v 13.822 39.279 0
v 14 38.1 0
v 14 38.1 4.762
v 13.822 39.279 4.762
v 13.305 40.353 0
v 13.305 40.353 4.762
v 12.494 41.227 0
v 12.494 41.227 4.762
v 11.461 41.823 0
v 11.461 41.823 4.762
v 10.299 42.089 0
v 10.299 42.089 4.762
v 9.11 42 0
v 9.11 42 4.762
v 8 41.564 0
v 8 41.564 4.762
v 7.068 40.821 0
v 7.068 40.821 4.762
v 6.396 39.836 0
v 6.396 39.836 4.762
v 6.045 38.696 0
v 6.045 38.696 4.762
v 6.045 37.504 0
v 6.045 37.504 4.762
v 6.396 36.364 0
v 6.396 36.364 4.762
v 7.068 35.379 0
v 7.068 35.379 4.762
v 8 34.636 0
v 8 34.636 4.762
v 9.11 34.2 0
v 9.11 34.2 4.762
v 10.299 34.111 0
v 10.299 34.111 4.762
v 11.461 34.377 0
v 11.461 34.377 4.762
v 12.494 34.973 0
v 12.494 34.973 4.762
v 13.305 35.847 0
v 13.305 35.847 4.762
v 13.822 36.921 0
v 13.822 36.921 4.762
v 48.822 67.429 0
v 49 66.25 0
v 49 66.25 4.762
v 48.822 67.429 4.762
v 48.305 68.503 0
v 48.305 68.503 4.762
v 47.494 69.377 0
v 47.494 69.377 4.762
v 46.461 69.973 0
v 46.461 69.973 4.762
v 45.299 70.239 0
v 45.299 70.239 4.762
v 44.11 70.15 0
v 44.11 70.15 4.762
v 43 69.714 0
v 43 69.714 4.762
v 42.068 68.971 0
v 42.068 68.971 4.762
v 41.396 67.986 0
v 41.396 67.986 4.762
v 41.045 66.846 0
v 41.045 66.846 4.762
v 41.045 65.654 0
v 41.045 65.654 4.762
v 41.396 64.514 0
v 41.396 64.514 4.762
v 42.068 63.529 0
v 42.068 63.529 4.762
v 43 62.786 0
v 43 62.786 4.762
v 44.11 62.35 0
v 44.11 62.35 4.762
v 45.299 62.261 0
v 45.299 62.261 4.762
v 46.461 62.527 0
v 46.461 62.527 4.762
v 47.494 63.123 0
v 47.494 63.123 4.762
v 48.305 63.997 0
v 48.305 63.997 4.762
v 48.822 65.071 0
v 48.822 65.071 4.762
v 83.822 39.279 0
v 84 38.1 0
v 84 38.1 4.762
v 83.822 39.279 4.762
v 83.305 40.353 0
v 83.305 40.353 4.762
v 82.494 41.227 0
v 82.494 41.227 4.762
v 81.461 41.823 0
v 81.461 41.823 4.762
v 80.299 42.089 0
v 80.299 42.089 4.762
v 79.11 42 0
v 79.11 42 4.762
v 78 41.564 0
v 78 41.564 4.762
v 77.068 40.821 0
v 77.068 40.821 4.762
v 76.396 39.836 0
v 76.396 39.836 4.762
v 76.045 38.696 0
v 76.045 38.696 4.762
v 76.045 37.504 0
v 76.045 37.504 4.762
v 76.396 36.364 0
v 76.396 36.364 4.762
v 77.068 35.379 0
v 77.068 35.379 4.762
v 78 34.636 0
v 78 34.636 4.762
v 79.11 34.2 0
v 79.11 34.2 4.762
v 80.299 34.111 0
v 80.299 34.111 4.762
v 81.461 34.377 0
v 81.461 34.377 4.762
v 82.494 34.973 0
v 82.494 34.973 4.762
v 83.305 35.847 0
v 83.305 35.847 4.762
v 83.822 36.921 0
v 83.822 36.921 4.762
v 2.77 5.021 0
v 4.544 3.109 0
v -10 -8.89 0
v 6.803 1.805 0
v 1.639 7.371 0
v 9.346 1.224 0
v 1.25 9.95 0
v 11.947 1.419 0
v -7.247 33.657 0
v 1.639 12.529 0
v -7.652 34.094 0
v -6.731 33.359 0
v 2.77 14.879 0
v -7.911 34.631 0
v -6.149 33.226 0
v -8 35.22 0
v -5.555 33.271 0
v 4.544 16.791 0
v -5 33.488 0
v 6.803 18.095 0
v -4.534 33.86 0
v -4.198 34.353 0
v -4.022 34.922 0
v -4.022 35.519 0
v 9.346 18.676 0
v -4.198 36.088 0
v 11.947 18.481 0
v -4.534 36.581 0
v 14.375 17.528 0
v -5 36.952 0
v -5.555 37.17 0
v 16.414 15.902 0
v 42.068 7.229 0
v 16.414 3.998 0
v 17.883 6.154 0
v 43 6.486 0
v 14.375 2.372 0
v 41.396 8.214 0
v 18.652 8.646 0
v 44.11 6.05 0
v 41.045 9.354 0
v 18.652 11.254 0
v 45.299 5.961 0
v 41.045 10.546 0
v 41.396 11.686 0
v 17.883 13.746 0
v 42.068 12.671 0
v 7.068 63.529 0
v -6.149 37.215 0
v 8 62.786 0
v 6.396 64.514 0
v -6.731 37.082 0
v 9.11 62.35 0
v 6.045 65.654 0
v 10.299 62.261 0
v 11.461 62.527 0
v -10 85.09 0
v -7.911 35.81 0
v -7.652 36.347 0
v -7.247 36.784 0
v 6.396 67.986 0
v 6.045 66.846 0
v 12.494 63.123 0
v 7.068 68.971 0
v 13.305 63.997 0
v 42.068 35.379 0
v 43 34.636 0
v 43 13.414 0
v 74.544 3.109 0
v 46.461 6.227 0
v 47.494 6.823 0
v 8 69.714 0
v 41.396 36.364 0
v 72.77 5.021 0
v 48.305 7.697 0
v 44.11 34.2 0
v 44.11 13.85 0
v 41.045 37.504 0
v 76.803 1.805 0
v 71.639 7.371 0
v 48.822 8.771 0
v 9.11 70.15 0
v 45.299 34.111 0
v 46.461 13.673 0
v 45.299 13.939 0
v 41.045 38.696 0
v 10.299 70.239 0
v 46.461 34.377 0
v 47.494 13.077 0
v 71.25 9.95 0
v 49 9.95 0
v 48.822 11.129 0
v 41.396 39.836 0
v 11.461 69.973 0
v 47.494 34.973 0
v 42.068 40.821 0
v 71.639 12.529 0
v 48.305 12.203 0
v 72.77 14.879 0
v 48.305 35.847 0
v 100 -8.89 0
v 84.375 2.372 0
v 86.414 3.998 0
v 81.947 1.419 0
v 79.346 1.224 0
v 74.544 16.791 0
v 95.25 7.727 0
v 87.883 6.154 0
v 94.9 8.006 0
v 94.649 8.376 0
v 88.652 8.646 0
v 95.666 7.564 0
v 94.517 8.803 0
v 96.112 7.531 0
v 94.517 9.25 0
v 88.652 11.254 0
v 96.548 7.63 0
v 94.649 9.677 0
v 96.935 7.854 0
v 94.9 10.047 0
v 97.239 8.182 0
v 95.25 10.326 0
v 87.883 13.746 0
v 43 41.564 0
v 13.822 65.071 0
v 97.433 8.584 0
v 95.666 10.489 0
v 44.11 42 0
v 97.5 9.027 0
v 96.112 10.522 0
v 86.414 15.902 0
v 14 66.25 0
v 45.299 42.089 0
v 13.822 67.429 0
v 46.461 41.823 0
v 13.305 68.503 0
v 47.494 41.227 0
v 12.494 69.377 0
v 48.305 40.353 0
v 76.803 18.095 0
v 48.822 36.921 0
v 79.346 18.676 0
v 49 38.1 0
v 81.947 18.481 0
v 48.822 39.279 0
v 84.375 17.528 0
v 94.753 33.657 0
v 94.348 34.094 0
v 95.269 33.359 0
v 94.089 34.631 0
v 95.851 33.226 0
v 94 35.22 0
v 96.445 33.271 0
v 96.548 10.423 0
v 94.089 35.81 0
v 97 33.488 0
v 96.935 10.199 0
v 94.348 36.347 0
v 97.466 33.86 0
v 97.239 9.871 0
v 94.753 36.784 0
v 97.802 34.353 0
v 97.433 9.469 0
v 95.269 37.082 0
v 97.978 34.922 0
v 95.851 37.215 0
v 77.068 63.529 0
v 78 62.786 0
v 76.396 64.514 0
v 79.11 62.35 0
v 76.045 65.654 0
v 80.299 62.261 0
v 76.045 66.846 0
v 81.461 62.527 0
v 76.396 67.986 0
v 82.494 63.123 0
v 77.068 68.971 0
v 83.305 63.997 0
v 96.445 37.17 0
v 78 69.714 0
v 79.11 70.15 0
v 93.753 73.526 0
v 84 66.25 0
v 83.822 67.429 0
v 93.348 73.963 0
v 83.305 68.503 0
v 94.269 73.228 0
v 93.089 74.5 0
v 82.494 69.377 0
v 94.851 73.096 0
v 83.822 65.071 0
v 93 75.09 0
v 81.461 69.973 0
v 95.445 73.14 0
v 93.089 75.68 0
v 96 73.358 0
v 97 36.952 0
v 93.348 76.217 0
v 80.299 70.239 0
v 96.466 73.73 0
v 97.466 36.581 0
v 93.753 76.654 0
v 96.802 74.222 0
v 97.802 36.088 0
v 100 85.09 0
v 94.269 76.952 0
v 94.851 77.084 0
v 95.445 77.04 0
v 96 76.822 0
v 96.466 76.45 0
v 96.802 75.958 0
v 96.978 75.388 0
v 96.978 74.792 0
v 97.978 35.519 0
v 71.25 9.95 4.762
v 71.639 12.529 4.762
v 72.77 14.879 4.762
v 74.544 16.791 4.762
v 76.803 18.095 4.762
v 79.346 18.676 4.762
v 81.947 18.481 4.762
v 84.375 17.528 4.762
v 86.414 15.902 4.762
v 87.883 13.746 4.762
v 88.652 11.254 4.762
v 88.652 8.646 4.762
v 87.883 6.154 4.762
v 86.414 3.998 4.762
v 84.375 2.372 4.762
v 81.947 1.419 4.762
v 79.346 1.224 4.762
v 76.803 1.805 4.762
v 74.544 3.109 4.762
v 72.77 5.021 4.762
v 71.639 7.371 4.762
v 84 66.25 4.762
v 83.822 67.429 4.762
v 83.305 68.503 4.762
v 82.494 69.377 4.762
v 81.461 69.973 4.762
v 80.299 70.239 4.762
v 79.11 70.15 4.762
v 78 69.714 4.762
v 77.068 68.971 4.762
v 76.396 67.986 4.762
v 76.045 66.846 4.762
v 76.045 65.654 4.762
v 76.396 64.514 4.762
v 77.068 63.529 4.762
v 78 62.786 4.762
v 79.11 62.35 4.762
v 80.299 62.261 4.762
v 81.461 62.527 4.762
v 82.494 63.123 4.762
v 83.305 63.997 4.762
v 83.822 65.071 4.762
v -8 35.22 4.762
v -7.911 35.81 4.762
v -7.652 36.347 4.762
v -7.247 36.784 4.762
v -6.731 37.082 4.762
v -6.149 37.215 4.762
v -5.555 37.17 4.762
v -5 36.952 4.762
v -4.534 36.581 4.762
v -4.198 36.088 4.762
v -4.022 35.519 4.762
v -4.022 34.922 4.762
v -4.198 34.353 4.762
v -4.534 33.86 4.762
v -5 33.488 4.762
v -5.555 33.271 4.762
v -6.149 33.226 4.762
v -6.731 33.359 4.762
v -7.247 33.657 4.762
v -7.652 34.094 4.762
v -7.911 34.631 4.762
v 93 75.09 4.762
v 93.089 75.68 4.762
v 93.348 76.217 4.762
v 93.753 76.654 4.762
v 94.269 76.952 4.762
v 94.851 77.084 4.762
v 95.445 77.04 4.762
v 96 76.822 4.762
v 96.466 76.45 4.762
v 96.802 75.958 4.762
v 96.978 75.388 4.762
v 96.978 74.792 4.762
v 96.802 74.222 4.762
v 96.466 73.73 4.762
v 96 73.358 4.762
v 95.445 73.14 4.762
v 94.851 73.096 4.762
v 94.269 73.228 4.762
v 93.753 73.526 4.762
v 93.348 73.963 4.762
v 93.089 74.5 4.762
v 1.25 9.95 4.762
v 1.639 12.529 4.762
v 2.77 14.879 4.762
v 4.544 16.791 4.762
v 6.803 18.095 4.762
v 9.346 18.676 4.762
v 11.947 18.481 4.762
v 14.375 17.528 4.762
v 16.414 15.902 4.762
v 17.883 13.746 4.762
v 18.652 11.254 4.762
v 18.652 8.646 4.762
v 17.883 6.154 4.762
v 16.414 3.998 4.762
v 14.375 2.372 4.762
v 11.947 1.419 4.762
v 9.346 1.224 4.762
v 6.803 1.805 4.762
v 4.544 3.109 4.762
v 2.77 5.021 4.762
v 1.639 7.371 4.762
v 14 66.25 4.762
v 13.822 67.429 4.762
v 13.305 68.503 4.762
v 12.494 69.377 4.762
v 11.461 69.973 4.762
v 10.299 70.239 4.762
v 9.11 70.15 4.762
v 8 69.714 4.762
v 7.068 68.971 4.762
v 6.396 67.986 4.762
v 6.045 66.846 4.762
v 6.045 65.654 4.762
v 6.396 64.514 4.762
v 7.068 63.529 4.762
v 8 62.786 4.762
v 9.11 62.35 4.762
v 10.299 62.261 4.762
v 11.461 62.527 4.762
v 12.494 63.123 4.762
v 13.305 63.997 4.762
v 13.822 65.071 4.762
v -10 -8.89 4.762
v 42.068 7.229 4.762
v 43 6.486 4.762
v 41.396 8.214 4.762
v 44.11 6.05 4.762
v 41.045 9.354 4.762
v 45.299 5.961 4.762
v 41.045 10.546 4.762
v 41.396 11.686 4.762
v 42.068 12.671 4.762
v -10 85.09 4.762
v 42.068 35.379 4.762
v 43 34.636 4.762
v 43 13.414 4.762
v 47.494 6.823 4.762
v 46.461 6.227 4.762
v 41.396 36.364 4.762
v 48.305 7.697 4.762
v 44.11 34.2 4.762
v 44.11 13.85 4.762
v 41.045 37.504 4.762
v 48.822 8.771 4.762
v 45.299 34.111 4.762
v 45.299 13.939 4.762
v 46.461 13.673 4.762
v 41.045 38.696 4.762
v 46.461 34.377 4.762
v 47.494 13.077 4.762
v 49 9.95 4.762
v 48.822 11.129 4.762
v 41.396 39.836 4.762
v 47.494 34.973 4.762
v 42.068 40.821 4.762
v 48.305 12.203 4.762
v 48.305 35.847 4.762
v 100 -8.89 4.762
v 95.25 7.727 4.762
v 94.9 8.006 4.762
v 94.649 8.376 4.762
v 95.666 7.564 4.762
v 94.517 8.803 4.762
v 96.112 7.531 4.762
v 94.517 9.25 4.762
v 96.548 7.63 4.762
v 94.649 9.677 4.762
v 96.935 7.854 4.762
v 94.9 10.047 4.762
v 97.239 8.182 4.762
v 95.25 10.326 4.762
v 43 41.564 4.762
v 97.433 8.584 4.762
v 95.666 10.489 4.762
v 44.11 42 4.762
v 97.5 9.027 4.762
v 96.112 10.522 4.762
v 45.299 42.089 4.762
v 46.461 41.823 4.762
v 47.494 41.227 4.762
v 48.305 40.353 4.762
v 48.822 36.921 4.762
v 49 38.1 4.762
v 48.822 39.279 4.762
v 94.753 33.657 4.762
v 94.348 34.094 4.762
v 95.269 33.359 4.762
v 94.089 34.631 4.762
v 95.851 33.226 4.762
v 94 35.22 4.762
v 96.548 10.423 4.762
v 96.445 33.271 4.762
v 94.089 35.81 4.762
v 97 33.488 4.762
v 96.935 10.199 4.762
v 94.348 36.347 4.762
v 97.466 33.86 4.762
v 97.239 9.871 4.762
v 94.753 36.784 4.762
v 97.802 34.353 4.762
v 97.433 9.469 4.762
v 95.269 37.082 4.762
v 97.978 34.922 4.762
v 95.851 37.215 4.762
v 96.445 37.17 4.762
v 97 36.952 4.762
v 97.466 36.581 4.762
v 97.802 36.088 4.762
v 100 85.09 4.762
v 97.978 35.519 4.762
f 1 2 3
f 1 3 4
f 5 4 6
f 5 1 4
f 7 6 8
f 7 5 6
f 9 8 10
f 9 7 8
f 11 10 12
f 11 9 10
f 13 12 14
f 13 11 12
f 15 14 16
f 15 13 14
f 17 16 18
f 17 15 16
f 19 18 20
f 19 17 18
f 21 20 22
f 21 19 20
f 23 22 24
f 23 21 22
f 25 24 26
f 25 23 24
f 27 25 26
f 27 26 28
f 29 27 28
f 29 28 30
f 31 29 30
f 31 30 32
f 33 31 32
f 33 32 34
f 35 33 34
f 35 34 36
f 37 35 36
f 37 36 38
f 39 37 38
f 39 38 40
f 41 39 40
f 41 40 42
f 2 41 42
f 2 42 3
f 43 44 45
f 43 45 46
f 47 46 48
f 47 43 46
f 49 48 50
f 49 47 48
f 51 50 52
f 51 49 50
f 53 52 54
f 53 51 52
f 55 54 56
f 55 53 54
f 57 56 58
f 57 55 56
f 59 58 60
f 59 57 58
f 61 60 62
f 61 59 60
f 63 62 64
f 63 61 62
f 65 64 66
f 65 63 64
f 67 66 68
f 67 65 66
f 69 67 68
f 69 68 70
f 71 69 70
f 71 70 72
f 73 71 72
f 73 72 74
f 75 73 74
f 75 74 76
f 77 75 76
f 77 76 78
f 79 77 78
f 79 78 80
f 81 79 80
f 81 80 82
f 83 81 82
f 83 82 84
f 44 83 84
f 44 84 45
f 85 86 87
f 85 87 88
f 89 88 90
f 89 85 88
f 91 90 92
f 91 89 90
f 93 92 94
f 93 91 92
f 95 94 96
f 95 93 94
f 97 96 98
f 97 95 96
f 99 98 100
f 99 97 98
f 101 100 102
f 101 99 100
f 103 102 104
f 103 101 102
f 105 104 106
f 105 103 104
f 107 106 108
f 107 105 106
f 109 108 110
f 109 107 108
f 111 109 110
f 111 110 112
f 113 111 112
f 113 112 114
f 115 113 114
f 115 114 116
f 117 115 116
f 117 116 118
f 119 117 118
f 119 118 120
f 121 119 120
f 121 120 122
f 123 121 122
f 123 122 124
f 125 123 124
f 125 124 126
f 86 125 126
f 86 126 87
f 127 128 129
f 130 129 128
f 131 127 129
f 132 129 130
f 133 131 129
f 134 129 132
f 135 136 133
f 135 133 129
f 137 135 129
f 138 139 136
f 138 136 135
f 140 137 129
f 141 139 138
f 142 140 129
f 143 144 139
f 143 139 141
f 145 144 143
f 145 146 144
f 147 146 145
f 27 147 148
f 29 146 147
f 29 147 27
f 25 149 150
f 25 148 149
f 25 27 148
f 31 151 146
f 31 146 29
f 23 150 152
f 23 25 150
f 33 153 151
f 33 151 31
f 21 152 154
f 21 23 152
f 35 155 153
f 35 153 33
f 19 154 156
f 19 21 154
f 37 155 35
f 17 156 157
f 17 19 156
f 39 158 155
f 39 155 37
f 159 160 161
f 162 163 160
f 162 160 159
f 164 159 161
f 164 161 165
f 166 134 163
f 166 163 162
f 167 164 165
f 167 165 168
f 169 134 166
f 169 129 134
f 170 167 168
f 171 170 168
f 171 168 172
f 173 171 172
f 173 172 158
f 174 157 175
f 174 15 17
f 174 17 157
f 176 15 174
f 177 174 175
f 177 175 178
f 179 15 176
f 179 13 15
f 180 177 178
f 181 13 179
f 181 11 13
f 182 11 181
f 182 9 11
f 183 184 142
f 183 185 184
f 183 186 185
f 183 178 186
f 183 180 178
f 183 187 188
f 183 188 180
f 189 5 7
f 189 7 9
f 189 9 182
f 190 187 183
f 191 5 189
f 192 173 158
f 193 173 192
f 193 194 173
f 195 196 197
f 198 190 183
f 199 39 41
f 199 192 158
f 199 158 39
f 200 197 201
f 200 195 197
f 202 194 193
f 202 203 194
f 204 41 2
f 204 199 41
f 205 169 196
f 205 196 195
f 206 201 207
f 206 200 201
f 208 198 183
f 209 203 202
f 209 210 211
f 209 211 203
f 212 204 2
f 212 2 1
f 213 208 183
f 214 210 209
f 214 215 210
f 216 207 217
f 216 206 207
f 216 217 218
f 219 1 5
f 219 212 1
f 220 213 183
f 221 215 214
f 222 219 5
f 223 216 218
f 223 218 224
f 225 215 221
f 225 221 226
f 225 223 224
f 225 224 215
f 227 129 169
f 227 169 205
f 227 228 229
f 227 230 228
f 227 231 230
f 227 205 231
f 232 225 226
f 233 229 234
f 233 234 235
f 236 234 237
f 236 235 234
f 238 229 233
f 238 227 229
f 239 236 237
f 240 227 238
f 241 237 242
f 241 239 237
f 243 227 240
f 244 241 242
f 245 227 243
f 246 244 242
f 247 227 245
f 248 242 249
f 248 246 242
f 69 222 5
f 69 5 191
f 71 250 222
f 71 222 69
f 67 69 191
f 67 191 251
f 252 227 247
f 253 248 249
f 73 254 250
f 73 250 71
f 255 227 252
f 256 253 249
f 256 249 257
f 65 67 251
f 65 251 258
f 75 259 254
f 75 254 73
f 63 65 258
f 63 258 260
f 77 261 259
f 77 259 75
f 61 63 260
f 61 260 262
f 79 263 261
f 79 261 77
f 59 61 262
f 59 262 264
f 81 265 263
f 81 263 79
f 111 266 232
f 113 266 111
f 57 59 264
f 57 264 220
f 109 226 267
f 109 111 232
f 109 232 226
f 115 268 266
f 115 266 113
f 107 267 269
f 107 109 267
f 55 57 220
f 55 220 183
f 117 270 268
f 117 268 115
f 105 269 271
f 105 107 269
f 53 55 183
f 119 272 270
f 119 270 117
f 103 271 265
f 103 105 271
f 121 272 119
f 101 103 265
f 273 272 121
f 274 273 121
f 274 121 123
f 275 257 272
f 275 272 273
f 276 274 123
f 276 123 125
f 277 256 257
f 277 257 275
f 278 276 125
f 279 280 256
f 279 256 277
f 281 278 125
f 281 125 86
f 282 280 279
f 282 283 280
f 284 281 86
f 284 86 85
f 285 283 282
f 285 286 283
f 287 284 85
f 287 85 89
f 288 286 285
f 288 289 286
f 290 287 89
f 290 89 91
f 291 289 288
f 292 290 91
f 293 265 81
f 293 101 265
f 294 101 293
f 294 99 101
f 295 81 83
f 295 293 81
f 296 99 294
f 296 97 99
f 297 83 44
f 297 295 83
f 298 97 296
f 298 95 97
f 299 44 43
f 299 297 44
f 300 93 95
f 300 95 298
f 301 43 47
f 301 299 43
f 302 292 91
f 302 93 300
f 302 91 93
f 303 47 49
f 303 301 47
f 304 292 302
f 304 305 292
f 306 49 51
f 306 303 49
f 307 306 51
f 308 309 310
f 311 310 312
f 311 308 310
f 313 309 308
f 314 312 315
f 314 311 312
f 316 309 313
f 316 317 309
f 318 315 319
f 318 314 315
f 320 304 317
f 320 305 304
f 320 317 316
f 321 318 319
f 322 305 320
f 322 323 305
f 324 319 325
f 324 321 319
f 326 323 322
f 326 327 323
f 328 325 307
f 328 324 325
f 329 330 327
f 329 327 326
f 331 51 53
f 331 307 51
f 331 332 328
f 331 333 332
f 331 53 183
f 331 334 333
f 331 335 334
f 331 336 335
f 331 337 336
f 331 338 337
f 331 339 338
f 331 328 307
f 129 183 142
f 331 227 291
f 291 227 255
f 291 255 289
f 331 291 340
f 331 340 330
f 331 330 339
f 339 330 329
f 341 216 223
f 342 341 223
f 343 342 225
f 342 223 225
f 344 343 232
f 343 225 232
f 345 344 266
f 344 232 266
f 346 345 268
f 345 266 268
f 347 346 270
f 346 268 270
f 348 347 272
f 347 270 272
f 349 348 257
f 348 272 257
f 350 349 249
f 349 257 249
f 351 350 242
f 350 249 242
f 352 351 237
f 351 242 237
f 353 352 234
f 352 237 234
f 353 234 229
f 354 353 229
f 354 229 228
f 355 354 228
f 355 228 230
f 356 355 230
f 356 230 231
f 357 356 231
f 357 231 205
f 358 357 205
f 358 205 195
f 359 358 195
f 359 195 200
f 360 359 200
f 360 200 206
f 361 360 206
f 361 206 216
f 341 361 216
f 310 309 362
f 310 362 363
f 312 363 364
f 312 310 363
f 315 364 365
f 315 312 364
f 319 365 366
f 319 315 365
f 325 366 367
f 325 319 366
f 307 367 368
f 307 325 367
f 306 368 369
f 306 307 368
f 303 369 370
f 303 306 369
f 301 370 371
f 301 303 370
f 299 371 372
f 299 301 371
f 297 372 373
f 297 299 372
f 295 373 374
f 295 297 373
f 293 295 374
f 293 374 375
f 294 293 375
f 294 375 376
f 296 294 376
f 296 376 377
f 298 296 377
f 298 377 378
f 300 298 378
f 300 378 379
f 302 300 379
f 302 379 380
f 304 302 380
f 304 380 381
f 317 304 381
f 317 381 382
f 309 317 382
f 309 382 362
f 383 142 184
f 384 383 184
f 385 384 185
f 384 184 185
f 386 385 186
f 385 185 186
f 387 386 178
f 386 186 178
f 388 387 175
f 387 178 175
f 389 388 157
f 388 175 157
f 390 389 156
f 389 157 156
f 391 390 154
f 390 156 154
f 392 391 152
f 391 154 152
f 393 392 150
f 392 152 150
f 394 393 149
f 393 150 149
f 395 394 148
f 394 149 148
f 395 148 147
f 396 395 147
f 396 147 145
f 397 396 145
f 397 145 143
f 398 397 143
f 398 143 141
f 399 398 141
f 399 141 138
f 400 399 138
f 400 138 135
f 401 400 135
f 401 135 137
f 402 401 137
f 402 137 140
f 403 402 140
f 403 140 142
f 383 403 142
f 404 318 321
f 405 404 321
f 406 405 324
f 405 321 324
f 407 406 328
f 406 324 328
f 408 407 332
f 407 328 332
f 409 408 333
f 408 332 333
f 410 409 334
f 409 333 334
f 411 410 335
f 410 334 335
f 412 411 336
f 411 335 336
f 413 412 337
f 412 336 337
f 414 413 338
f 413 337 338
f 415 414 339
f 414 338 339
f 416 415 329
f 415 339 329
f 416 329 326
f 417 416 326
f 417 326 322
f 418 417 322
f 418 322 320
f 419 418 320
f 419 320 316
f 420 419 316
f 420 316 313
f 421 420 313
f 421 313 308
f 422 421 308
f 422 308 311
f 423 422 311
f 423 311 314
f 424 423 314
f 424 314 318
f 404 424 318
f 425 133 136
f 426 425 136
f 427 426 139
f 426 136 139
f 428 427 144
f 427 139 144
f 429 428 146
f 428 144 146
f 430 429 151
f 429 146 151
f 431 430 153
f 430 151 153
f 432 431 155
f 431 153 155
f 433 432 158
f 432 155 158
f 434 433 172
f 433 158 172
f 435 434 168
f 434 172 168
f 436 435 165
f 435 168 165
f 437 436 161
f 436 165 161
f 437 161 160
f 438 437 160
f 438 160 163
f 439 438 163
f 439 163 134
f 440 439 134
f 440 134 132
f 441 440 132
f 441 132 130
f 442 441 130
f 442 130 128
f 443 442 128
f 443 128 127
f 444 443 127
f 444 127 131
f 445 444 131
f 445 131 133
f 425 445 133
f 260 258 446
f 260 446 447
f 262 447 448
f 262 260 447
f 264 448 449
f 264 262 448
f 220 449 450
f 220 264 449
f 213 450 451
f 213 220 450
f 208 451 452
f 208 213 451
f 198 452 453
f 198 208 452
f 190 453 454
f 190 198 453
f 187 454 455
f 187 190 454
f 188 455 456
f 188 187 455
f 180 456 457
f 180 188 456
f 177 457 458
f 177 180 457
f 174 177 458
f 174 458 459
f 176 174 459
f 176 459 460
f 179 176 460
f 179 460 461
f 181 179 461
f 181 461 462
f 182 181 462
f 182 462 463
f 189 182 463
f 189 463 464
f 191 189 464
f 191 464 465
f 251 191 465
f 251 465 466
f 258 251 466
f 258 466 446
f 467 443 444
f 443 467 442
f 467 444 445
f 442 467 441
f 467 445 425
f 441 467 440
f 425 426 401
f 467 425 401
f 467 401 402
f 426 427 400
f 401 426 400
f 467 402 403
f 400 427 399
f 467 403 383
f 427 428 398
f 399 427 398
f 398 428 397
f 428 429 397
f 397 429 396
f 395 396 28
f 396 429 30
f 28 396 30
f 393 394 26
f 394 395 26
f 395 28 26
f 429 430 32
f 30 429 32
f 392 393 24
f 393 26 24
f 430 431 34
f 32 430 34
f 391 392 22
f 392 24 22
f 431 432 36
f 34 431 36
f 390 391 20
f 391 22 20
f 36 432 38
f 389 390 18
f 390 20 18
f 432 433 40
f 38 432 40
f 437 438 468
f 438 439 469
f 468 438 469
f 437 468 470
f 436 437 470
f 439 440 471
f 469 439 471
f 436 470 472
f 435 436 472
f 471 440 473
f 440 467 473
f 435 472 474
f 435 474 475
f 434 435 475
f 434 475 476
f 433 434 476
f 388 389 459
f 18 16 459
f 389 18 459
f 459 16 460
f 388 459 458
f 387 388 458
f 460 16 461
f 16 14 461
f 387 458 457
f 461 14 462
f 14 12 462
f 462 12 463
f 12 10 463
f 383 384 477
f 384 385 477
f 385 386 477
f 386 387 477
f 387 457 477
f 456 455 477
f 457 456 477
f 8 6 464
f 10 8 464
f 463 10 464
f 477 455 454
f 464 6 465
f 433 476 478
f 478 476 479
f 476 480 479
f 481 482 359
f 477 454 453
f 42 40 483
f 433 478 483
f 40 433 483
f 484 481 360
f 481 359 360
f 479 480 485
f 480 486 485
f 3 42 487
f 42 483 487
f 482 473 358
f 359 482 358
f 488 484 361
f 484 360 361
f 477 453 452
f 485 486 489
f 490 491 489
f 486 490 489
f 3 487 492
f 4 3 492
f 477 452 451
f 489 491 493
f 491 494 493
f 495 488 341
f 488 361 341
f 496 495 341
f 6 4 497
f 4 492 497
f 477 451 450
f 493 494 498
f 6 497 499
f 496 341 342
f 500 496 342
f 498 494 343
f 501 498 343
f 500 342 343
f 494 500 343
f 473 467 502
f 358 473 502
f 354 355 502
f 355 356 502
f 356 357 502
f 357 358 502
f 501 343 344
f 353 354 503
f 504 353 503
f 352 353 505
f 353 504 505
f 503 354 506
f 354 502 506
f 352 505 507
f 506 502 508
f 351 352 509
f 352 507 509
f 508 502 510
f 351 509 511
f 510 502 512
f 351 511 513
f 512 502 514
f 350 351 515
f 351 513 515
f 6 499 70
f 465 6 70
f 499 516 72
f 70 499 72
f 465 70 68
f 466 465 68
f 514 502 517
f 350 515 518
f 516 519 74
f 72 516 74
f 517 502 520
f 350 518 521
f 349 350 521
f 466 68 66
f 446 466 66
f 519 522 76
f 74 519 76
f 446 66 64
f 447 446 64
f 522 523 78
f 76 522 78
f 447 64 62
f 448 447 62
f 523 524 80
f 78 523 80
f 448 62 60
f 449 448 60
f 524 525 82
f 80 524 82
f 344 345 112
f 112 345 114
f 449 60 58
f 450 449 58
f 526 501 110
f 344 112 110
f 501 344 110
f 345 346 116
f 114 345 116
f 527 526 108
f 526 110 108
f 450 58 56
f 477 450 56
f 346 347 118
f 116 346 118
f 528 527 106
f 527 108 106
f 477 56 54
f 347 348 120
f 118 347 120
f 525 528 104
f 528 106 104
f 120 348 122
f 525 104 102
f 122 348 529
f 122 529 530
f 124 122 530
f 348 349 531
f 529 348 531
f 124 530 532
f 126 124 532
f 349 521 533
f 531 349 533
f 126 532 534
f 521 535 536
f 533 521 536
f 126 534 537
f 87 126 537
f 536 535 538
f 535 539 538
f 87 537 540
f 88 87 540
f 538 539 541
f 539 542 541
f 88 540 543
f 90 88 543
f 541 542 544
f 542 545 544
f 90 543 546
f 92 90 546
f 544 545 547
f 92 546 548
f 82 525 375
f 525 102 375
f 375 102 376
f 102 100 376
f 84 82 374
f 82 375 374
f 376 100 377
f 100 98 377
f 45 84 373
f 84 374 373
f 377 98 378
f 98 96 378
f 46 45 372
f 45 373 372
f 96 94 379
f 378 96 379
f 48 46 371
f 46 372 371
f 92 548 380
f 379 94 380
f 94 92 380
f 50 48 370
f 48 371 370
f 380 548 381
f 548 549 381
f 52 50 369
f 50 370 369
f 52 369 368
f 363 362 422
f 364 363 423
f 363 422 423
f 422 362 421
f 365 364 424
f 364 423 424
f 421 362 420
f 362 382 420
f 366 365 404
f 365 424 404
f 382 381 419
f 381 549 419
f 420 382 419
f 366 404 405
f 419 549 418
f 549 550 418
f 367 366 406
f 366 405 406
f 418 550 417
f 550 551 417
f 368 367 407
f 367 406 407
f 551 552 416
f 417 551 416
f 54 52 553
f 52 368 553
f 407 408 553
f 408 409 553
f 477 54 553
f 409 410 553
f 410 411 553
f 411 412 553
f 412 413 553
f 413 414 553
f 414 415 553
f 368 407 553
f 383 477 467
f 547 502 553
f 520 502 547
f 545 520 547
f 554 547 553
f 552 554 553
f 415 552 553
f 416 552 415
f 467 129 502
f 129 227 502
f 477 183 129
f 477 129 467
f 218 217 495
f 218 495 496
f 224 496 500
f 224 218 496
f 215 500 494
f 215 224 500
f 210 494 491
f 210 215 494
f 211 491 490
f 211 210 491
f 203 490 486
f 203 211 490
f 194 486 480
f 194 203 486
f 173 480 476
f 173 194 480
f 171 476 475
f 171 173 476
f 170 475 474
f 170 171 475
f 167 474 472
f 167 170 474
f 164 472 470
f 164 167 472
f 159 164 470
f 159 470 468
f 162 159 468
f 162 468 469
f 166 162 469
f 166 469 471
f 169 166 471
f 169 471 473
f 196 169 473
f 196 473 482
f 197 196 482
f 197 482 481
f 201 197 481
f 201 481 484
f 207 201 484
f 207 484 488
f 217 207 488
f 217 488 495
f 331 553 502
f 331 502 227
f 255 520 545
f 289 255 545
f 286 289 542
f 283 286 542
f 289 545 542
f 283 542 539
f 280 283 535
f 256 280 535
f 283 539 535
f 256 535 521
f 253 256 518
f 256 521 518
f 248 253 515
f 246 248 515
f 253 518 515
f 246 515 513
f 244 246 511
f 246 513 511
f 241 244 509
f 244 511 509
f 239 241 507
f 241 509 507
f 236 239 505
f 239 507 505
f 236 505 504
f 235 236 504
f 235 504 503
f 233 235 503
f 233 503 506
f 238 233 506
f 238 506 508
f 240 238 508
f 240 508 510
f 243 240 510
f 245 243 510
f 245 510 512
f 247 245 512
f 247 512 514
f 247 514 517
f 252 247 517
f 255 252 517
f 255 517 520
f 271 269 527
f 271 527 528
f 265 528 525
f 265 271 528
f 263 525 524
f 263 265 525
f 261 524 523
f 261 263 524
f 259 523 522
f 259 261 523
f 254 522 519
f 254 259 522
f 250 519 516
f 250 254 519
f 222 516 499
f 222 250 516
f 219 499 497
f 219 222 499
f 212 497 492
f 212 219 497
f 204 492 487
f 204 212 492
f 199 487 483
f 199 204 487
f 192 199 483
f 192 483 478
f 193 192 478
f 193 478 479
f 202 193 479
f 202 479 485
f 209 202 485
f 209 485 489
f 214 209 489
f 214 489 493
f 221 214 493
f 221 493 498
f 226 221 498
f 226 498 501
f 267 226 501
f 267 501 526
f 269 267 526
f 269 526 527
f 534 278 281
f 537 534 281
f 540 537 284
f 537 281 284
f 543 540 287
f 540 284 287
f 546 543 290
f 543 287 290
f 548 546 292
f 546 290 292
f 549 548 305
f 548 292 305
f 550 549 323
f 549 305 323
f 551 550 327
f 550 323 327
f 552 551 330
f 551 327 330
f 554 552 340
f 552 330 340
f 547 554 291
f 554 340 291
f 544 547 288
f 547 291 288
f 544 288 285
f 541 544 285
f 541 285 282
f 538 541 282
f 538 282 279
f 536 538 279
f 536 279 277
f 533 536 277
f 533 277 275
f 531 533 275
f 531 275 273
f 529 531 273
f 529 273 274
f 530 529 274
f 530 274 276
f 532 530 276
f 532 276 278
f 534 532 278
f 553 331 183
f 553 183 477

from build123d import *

# Parameters (mm, degrees)
CROQUIS1_W               = 90
CROQUIS1_H               = 76.2
CROQUIS1_R               = 4
SALIENTE_EXTRUIR1_DEPTH  = 0.47625
CROQUIS1_2_W             = 90
CROQUIS1_2_H             = 76.2
CROQUIS1_2_R             = 4
SALIENTE_EXTRUIR2_DEPTH  = 4.7625
CROQUIS3_W               = 90
CROQUIS3_H               = 4.7625
SALIENTE_EXTRUIR3_DEPTH  = 4.445
CROQUIS5_W               = 90
CROQUIS5_H               = 4.7625
SALIENTE_EXTRUIR4_DEPTH  = 4.445
CROQUIS6_W               = 4.7625
CROQUIS6_H               = 85.09
SALIENTE_EXTRUIR5_DEPTH  = 5
CROQUIS7_W               = 4.7625
CROQUIS7_H               = 85.09
SALIENTE_EXTRUIR6_DEPTH  = 5
CROQUIS8_W               = 100
CROQUIS8_H               = 4.7625
SALIENTE_EXTRUIR7_DEPTH  = 4.445
CROQUIS9_W               = 100
CROQUIS9_H               = 4.7625
SALIENTE_EXTRUIR8_DEPTH  = 4.445
CROQUIS10_W              = 4.7625
CROQUIS10_H              = 93.98
SALIENTE_EXTRUIR9_DEPTH  = 5
CROQUIS12_W              = 4.7625
CROQUIS12_H              = 93.98
SALIENTE_EXTRUIR10_DEPTH = 5
SKETCH1_R                = 8.75
CUT_EXTRUDE1_DEPTH       = 10
SKETCH2_R                = 2
CUT_EXTRUDE2_DEPTH       = 10
SKETCH3_R                = 1.5
CUT_EXTRUDE3_DEPTH       = 10
SKETCH4_R                = 2
CUT_EXTRUDE4_DEPTH       = 10


with BuildPart() as part:
    # Croquis1 → Saliente-Extruir1 (new body)
    with BuildSketch(Plane.XY):
        with Locations((45, 38.1)):
            Rectangle(CROQUIS1_W, CROQUIS1_H)
        with Locations((45, 38.1)):
            Circle(CROQUIS1_R, mode=Mode.SUBTRACT)
        with Locations((10, 9.95)):
            Circle(CROQUIS1_R, mode=Mode.SUBTRACT)
        with Locations((10, 66.25)):
            Circle(CROQUIS1_R, mode=Mode.SUBTRACT)
        with Locations((80, 66.25)):
            Circle(CROQUIS1_R, mode=Mode.SUBTRACT)
        with Locations((80, 9.95)):
            Circle(CROQUIS1_R, mode=Mode.SUBTRACT)
        with Locations((45, 66.25)):
            Circle(CROQUIS1_R, mode=Mode.SUBTRACT)
        with Locations((10, 38.1)):
            Circle(CROQUIS1_R, mode=Mode.SUBTRACT)
        with Locations((80, 38.1)):
            Circle(CROQUIS1_R, mode=Mode.SUBTRACT)
        with Locations((45, 9.95)):
            Circle(CROQUIS1_R, mode=Mode.SUBTRACT)
    extrude(amount=SALIENTE_EXTRUIR1_DEPTH)

    # Croquis1<2> → Saliente-Extruir2 (add)
    with BuildSketch(Plane.XY):
        with Locations((45, 38.1)):
            Rectangle(CROQUIS1_2_W, CROQUIS1_2_H)
        with Locations((45, 38.1)):
            Circle(CROQUIS1_2_R, mode=Mode.SUBTRACT)
        with Locations((10, 9.95)):
            Circle(CROQUIS1_2_R, mode=Mode.SUBTRACT)
        with Locations((10, 66.25)):
            Circle(CROQUIS1_2_R, mode=Mode.SUBTRACT)
        with Locations((80, 66.25)):
            Circle(CROQUIS1_2_R, mode=Mode.SUBTRACT)
        with Locations((80, 9.95)):
            Circle(CROQUIS1_2_R, mode=Mode.SUBTRACT)
        with Locations((45, 66.25)):
            Circle(CROQUIS1_2_R, mode=Mode.SUBTRACT)
        with Locations((10, 38.1)):
            Circle(CROQUIS1_2_R, mode=Mode.SUBTRACT)
        with Locations((80, 38.1)):
            Circle(CROQUIS1_2_R, mode=Mode.SUBTRACT)
        with Locations((45, 9.95)):
            Circle(CROQUIS1_2_R, mode=Mode.SUBTRACT)
    extrude(amount=SALIENTE_EXTRUIR2_DEPTH)

    # Croquis3 → Saliente-Extruir3 (add)
    with BuildSketch(Plane.XZ):
        with Locations((45, 2.38125)):
            Rectangle(CROQUIS3_W, CROQUIS3_H)
    extrude(amount=SALIENTE_EXTRUIR3_DEPTH)

    # Croquis5 → Saliente-Extruir4 (add)
    with BuildSketch(Plane(origin=(0, 76.2, 0), x_dir=(1, 0, 0), z_dir=(0, 1, 0))):
        with Locations((45, -2.38125)):
            Rectangle(CROQUIS5_W, CROQUIS5_H)
    extrude(amount=SALIENTE_EXTRUIR4_DEPTH)

    # Croquis6 → Saliente-Extruir5 (add)
    with BuildSketch(Plane.ZY):
        with Locations((2.38125, 38.1)):
            Rectangle(CROQUIS6_W, CROQUIS6_H)
    extrude(amount=SALIENTE_EXTRUIR5_DEPTH)

    # Croquis7 → Saliente-Extruir6 (add)
    with BuildSketch(Plane(origin=(90, 0, 0), x_dir=(0, 0, -1), z_dir=(1, 0, 0))):
        with Locations((-2.38125, 38.1)):
            Rectangle(CROQUIS7_W, CROQUIS7_H)
    extrude(amount=SALIENTE_EXTRUIR6_DEPTH)

    # Croquis8 → Saliente-Extruir7 (add)
    with BuildSketch(Plane.XZ.offset(4.445)):
        with Locations((45, 2.38125)):
            Rectangle(CROQUIS8_W, CROQUIS8_H)
    extrude(amount=SALIENTE_EXTRUIR7_DEPTH)

    # Croquis9 → Saliente-Extruir8 (add)
    with BuildSketch(Plane(origin=(0, 80.645, 0), x_dir=(1, 0, 0), z_dir=(0, 1, 0))):
        with Locations((45, -2.38125)):
            Rectangle(CROQUIS9_W, CROQUIS9_H)
    extrude(amount=SALIENTE_EXTRUIR8_DEPTH)

    # Croquis10 → Saliente-Extruir9 (add)
    with BuildSketch(Plane(origin=(95, 0, 0), x_dir=(0, 0, -1), z_dir=(1, 0, 0))):
        with Locations((-2.38125, 38.1)):
            Rectangle(CROQUIS10_W, CROQUIS10_H)
    extrude(amount=SALIENTE_EXTRUIR9_DEPTH)

    # Croquis12 → Saliente-Extruir10 (add)
    with BuildSketch(Plane.ZY.offset(5)):
        with Locations((2.38125, 38.1)):
            Rectangle(CROQUIS12_W, CROQUIS12_H)
    extrude(amount=SALIENTE_EXTRUIR10_DEPTH)

    # Sketch1 → Cut-Extrude1 (cut)
    with BuildSketch(Plane(origin=(0, 0, 0), x_dir=(-1, 0, 0), z_dir=(0, 0, -1))):
        with Locations((-80, 9.95)):
            Circle(SKETCH1_R)
        with Locations((-10, 9.95)):
            Circle(SKETCH1_R)
    extrude(amount=-CUT_EXTRUDE1_DEPTH, mode=Mode.SUBTRACT)

    # Sketch2 → Cut-Extrude2 (cut)
    with BuildSketch(Plane(origin=(0, 0, 0), x_dir=(-1, 0, 0), z_dir=(0, 0, -1))):
        with Locations((-95, 75.09)):
            Circle(SKETCH2_R)
    extrude(amount=-CUT_EXTRUDE2_DEPTH, mode=Mode.SUBTRACT)

    # Sketch3 → Cut-Extrude3 (cut)
    with BuildSketch(Plane.XY.offset(4.7625)):
        with Locations((96, 9.026516715)):
            Circle(SKETCH3_R)
    extrude(amount=-CUT_EXTRUDE3_DEPTH, mode=Mode.SUBTRACT)

    # Sketch4 → Cut-Extrude4 (cut)
    with BuildSketch(Plane(origin=(0, 0, 0), x_dir=(-1, 0, 0), z_dir=(0, 0, -1))):
        with Locations((6, 35.220430455)):
            Circle(SKETCH4_R)
        with Locations((-96, 35.220430455)):
            Circle(SKETCH4_R)
    extrude(amount=-CUT_EXTRUDE4_DEPTH, mode=Mode.SUBTRACT)


solid = part.part
